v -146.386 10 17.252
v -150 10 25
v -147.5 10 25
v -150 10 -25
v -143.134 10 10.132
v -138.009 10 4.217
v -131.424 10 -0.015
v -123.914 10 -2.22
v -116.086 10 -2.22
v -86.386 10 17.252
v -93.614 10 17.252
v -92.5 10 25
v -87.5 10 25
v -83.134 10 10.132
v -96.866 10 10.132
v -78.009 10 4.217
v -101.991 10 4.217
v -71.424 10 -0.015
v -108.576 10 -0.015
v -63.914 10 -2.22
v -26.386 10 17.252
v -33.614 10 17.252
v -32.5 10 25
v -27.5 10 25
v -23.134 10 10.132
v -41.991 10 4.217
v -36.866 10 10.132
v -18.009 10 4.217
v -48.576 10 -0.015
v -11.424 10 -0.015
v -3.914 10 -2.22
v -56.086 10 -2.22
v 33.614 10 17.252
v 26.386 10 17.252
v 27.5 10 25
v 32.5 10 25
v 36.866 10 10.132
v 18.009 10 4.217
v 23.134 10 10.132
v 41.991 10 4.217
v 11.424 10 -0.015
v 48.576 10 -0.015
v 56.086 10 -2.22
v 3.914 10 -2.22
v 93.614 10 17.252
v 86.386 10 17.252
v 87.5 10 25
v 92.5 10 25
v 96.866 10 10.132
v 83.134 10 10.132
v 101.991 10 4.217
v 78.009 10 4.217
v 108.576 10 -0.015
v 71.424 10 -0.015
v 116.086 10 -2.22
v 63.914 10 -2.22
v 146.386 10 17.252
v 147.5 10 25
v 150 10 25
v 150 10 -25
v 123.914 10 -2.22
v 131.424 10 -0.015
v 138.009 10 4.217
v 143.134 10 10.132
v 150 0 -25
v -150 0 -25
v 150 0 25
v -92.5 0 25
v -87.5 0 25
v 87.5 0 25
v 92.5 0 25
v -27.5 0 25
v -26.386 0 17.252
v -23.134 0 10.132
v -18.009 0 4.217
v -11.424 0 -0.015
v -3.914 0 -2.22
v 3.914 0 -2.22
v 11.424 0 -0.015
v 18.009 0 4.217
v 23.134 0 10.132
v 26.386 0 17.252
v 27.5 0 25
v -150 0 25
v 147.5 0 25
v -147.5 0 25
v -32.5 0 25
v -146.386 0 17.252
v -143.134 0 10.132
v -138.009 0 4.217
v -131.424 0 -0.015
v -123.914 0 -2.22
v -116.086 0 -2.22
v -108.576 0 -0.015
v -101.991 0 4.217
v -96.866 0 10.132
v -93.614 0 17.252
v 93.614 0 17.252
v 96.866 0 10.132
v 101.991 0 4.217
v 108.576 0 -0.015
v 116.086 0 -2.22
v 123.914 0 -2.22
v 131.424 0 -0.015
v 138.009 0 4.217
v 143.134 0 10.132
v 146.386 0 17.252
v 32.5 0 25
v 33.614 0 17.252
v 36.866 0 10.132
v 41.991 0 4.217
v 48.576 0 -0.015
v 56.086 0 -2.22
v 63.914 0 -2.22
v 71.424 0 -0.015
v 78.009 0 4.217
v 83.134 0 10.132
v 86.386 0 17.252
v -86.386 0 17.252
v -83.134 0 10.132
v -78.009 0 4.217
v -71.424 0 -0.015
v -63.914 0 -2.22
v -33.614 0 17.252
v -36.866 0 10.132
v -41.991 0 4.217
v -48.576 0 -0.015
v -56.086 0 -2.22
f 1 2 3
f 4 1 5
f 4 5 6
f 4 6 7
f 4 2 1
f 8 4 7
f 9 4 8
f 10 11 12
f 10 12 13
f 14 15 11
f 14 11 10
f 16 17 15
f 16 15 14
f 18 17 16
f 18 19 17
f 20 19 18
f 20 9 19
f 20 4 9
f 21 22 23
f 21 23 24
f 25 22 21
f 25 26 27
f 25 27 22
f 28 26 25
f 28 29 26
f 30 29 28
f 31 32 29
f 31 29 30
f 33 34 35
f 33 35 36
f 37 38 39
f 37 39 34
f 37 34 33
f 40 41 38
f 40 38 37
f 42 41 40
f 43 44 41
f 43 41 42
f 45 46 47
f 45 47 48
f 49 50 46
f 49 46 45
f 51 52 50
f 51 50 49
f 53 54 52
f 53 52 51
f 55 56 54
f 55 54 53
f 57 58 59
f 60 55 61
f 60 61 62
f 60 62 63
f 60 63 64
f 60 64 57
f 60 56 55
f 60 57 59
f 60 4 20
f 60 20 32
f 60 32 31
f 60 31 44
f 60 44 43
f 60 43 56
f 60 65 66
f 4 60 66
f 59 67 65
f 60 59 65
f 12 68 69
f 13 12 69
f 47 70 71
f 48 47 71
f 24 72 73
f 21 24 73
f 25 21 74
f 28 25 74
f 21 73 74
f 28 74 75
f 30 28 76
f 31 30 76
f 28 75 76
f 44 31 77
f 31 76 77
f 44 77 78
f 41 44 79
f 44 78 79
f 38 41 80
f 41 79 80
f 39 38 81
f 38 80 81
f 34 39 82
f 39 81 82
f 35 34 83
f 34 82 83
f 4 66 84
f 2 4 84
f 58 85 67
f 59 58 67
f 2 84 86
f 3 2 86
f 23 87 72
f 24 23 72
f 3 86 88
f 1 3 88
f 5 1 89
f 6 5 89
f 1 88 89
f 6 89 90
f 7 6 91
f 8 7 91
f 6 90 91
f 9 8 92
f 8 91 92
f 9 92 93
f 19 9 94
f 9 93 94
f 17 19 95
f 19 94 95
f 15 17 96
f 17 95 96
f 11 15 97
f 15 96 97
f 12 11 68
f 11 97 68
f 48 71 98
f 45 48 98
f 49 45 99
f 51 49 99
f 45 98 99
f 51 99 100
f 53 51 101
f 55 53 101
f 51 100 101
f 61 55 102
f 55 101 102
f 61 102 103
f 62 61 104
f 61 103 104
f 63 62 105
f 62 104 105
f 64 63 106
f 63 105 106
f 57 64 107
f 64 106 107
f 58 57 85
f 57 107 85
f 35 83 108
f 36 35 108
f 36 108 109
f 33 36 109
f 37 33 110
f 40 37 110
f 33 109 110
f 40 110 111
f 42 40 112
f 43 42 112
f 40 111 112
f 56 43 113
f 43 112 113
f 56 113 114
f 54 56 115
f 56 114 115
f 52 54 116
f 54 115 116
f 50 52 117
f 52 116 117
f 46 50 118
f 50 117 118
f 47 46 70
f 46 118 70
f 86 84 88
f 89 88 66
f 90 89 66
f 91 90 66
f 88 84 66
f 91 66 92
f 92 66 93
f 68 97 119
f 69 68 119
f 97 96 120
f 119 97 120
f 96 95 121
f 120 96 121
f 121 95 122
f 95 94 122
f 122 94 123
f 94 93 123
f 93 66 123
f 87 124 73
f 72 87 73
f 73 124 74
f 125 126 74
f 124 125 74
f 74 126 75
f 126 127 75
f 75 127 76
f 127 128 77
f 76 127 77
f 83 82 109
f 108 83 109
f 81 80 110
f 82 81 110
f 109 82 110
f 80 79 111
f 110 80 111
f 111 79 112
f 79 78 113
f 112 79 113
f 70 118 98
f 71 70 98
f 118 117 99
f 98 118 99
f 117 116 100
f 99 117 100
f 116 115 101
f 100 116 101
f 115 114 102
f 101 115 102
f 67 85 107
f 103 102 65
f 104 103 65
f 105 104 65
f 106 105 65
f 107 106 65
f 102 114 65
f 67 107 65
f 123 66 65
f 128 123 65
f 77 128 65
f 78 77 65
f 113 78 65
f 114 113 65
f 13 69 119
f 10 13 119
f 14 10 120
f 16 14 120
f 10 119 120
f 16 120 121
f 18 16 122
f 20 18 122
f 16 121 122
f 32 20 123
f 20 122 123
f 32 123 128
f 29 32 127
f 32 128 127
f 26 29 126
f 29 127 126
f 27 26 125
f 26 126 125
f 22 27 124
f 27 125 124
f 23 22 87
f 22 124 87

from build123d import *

# Parameters (mm, degrees)
BOSS_EXTRU_1_DEPTH = 10


with BuildPart() as part:
    # Esquisse1 → Boss.-Extru.1 (new body)
    with BuildSketch(Plane(origin=(0, 0, 0), x_dir=(1, 0, 0), z_dir=(0, 1, 0))):
        with BuildLine():
            Line((147.5, -25), (150, -25))
            Line((150, -25), (150, 25))
            Line((150, 25), (-150, 25))
            Line((-150, 25), (-150, -25))
            Line((-150, -25), (-147.5, -25))
            ThreePointArc((-147.5, -25), (-120, 2.5), (-92.5, -25))
            Line((-92.5, -25), (-87.5, -25))
            ThreePointArc((-87.5, -25), (-60, 2.5), (-32.5, -25))
            Line((-32.5, -25), (-27.5, -25))
            ThreePointArc((-27.5, -25), (0, 2.5), (27.5, -25))
            Line((27.5, -25), (32.5, -25))
            ThreePointArc((32.5, -25), (60, 2.5), (87.5, -25))
            Line((87.5, -25), (92.5, -25))
            ThreePointArc((92.5, -25), (120, 2.5), (147.5, -25))
        make_face()
    extrude(amount=BOSS_EXTRU_1_DEPTH)


solid = part.part
